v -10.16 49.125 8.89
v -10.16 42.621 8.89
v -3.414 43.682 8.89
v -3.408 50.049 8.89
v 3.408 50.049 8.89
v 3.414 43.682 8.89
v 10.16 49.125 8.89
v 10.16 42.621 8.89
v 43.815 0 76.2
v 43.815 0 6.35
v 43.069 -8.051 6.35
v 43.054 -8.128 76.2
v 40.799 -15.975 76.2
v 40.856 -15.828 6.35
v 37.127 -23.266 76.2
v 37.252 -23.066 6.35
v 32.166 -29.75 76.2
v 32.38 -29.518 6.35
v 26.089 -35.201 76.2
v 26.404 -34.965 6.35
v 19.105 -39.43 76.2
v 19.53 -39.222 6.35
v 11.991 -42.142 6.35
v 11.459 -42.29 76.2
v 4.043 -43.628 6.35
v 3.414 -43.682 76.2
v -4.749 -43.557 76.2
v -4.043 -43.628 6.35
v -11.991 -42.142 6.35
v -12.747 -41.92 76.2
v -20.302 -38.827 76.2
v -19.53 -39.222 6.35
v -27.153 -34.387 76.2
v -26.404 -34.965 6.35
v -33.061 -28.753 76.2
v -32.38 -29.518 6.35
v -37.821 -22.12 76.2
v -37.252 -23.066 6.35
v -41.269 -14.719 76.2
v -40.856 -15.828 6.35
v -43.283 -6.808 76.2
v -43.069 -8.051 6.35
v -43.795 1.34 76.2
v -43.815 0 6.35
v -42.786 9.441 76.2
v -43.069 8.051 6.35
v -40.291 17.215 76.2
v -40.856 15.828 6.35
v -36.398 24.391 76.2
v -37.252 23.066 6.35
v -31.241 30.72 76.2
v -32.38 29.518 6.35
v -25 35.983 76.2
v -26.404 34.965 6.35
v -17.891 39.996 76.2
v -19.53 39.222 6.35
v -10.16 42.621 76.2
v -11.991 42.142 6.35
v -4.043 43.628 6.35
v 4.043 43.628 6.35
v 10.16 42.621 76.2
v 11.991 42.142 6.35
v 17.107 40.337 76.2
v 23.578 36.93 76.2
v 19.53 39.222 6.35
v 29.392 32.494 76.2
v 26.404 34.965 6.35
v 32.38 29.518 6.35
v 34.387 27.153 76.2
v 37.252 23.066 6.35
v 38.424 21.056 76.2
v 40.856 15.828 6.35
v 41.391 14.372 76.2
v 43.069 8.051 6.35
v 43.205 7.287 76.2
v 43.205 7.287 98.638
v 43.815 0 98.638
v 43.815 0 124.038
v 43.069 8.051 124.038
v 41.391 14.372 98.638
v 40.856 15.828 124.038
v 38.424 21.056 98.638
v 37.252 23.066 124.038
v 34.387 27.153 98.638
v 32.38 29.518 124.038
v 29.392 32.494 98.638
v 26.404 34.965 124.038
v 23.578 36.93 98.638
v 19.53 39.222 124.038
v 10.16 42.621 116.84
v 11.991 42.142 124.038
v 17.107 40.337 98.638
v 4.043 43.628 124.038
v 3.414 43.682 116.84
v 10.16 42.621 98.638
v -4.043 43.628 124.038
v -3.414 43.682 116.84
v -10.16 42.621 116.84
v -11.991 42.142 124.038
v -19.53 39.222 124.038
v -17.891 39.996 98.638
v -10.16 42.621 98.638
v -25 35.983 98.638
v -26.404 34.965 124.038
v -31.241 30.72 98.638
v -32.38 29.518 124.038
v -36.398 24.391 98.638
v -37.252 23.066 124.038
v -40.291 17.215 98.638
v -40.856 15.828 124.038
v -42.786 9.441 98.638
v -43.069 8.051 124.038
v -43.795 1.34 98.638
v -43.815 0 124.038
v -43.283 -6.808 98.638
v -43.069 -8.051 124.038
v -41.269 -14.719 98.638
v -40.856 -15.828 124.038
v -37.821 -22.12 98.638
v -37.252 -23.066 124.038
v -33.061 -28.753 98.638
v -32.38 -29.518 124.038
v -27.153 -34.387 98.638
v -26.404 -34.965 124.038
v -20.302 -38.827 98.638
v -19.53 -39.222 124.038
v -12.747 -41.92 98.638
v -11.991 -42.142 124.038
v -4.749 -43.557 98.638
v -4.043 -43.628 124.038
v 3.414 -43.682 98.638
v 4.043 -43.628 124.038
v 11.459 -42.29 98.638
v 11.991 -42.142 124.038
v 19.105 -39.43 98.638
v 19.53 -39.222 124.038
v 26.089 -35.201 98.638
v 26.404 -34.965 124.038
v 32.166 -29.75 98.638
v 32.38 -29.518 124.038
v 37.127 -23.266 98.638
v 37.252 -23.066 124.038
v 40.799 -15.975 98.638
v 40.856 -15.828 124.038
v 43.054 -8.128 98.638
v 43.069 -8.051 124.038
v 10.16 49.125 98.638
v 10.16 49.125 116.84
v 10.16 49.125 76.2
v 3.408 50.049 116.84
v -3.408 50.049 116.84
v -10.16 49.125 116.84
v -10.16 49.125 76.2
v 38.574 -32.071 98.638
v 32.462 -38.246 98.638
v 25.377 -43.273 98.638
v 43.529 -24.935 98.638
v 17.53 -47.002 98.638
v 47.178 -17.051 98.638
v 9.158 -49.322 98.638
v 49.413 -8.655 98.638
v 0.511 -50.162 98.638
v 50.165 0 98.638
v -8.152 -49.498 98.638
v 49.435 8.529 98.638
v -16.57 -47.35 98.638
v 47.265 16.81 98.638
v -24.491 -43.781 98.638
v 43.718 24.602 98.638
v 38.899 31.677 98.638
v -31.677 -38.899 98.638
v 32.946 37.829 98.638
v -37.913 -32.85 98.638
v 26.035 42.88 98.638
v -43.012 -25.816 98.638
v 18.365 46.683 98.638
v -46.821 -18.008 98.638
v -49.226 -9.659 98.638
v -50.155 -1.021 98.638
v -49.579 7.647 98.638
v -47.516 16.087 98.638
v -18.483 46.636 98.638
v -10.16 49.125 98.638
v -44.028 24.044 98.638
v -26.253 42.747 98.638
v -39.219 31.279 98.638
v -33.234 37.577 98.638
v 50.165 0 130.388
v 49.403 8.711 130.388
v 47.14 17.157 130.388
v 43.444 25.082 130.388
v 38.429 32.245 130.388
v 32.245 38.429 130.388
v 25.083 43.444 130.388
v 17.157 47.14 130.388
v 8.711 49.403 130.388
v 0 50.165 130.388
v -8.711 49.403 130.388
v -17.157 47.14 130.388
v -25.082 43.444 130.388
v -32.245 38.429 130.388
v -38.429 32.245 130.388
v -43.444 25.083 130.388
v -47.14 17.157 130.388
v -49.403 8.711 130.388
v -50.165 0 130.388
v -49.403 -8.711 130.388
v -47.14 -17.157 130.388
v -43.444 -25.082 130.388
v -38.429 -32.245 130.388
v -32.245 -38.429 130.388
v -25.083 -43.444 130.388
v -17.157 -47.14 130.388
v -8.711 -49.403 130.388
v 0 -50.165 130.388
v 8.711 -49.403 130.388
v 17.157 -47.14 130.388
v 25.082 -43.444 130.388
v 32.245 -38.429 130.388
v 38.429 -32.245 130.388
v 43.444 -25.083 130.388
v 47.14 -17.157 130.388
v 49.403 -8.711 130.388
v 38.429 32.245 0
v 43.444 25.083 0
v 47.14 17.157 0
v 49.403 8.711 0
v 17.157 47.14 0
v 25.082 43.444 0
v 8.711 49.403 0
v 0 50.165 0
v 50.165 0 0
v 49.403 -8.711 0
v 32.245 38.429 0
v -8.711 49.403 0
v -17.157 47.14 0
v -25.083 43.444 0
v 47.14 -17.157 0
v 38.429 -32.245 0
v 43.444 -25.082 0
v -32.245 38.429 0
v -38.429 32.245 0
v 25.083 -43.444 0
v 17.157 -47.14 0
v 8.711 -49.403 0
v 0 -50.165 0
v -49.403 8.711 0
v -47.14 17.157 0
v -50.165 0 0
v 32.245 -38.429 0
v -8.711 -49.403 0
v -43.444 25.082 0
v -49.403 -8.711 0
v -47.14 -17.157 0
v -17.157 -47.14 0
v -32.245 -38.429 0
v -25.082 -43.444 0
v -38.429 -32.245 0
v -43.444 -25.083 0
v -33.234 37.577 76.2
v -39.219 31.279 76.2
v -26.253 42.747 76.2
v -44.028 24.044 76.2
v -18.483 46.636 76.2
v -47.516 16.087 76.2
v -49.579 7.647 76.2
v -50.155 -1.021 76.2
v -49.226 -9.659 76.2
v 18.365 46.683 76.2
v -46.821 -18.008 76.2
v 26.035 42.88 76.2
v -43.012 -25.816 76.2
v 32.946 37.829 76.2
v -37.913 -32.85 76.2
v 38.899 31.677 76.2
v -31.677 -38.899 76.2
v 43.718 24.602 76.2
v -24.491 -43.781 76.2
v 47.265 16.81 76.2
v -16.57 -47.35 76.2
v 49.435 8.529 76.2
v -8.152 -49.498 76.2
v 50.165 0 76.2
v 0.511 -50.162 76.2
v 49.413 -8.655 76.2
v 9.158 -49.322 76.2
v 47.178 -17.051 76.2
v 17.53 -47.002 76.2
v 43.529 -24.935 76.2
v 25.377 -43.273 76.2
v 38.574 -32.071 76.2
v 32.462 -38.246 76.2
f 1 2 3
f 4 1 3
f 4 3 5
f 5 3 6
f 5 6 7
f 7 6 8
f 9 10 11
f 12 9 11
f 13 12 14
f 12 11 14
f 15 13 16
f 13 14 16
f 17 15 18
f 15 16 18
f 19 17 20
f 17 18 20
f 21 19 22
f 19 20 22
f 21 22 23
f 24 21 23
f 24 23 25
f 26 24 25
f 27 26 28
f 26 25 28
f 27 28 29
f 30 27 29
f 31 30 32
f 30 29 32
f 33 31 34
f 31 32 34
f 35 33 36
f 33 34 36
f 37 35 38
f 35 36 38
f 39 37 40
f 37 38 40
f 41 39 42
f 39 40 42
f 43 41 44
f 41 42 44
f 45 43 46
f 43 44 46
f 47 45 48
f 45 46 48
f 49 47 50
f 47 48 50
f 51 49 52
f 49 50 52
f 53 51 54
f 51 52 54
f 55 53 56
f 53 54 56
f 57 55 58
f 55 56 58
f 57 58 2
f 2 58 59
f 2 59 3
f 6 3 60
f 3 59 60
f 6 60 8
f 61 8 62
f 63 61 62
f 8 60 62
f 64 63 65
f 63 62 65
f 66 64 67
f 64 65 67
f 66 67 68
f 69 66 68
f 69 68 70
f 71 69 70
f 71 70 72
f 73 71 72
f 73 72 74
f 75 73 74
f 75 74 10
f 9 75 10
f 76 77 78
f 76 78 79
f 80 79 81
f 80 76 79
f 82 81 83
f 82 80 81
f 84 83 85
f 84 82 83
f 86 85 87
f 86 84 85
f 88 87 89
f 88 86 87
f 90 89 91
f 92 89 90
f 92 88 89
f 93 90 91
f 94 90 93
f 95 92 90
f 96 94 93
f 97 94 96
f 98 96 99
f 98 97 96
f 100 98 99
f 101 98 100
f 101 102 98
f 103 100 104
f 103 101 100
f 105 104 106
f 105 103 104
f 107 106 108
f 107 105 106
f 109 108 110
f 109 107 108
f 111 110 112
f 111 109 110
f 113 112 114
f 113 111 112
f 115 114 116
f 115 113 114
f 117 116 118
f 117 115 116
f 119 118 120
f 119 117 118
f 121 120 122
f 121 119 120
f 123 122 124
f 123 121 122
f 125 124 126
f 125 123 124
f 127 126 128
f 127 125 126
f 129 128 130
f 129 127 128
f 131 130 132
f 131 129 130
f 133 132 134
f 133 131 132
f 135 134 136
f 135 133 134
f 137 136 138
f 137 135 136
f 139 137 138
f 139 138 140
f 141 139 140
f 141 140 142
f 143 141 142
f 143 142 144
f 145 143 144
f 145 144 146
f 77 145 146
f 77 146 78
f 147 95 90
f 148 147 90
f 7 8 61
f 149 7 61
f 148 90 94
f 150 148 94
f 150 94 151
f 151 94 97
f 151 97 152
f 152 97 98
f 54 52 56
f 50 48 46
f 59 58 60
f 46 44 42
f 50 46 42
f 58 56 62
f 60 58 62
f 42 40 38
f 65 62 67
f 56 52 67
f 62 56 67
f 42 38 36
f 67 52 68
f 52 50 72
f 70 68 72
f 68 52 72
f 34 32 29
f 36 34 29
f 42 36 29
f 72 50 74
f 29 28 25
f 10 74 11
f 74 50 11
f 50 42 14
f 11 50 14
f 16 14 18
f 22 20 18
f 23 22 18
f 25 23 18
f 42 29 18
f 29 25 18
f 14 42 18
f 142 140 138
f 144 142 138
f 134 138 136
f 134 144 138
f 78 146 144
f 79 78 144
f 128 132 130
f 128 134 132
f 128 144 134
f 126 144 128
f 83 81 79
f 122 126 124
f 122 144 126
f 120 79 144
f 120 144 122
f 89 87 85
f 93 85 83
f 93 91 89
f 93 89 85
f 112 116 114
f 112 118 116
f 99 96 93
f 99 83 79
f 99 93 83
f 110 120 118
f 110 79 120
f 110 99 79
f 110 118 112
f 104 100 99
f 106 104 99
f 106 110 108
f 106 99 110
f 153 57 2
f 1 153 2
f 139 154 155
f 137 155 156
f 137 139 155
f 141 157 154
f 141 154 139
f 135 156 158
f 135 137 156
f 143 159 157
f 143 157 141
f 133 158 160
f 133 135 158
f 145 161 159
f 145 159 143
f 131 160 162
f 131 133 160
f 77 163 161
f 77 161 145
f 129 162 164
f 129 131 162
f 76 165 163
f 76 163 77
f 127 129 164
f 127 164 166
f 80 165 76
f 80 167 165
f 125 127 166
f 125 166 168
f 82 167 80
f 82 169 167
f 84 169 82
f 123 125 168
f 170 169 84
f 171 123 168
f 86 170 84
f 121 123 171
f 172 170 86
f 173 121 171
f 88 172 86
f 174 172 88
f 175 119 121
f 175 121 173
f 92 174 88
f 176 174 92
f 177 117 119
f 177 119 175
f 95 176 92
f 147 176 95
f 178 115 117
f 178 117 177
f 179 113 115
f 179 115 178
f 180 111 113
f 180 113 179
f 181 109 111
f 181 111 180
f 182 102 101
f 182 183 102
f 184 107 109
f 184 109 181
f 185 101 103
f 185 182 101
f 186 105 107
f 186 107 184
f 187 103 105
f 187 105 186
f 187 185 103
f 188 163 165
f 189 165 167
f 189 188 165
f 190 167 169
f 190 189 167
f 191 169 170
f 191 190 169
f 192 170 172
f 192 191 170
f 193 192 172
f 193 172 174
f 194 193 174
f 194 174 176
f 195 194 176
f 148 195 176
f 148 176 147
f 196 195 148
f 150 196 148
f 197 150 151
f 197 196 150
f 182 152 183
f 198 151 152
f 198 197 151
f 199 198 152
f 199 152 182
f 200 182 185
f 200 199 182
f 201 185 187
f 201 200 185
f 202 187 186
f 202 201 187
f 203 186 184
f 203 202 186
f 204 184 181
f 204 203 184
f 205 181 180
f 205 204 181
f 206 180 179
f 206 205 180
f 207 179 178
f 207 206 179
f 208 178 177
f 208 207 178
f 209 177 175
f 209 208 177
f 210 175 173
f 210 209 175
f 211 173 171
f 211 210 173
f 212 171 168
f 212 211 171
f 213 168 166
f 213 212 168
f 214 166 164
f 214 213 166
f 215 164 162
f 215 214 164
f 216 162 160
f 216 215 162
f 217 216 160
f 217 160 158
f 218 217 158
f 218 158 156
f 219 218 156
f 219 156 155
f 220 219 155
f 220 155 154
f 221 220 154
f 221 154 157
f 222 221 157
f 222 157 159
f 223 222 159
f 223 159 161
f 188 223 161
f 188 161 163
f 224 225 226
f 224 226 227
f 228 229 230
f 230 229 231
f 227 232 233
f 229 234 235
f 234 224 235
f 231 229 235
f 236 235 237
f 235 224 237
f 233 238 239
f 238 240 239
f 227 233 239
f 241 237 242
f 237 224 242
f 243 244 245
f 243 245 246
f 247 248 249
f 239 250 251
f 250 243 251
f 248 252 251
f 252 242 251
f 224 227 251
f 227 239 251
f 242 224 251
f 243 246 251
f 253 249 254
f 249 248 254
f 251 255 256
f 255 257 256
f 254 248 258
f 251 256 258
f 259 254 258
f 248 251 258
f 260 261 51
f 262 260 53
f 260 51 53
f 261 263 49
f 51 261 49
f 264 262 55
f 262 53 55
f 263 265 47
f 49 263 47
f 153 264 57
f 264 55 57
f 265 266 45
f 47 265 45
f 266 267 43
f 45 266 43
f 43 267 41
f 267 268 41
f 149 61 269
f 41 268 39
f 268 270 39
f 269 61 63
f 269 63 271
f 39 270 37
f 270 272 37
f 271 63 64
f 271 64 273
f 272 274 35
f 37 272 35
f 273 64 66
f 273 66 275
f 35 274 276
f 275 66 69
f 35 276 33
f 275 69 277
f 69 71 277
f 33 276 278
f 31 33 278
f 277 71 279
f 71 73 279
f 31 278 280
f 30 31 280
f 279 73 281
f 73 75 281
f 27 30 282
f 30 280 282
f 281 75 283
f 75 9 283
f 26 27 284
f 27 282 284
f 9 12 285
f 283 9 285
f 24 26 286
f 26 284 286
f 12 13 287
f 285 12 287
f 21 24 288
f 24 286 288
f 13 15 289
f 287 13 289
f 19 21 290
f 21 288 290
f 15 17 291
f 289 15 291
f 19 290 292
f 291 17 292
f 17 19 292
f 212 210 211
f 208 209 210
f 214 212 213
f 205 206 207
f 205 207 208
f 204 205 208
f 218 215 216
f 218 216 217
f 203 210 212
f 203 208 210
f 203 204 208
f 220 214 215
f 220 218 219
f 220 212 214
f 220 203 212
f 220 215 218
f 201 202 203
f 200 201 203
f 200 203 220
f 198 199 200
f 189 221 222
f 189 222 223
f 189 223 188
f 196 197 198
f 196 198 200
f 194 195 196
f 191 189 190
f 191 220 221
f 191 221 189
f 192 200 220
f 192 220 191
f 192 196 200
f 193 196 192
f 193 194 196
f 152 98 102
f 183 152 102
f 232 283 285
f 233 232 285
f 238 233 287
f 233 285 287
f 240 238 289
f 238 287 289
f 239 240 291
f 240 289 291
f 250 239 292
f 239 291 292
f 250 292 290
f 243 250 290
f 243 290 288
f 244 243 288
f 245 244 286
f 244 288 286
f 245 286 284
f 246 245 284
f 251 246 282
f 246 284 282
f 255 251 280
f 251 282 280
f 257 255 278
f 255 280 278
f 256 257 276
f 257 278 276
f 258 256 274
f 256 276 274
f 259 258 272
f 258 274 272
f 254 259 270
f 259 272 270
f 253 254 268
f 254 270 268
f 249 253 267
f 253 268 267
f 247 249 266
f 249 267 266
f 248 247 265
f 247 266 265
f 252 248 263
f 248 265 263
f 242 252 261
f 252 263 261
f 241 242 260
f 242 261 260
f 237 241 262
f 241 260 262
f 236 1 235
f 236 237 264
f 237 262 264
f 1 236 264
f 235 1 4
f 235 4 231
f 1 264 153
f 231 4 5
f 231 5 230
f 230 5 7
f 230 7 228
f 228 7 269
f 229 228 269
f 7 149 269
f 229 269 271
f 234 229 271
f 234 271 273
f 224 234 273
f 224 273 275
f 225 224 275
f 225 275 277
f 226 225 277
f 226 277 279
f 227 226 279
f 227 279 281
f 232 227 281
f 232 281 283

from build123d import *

# Parameters (mm, degrees)
F3_DEPTH = 99.06
F7_DEPTH = 94.996


with BuildPart() as f1:
    # F0 (on Front) → F1 (revolve)
    with BuildSketch(Plane.XZ):
        Polygon((0, 6.35), (0, 0), (50.165, 0), (50.165, 76.2), (43.815, 76.2), (43.815, 6.35), align=None)
    revolve(axis=Axis((0, 0, 3.175), (0, 0, -1)))

    # F2 (on Front) → F3 (cut)
    with BuildSketch(Plane.XZ):
        Polygon((-10.16, 8.89), (0, 8.89), (10.16, 8.89), (10.16, 76.2), (-10.16, 76.2), align=None)
    extrude(amount=-F3_DEPTH, mode=Mode.SUBTRACT)


with BuildPart() as f5:
    # F4 (on Front) → F5 (revolve)
    with BuildSketch(Plane.XZ):
        Polygon((50.165, 130.388408), (0, 130.388408), (0, 124.038408), (43.815, 124.038408), (43.815, 98.638408), (50.165, 98.638408), align=None)
    revolve(axis=Axis((0, 0, 127.213408), (0, 0, 1)))

    # F6 (on Front) → F7 (cut)
    with BuildSketch(Plane.XZ):
        Polygon((-10.16, 78.74), (0, 78.74), (10.16, 78.74), (10.16, 116.84), (-10.16, 116.84), align=None)
    extrude(amount=-F7_DEPTH, mode=Mode.SUBTRACT)


solid = Compound([f1.part, f5.part])
